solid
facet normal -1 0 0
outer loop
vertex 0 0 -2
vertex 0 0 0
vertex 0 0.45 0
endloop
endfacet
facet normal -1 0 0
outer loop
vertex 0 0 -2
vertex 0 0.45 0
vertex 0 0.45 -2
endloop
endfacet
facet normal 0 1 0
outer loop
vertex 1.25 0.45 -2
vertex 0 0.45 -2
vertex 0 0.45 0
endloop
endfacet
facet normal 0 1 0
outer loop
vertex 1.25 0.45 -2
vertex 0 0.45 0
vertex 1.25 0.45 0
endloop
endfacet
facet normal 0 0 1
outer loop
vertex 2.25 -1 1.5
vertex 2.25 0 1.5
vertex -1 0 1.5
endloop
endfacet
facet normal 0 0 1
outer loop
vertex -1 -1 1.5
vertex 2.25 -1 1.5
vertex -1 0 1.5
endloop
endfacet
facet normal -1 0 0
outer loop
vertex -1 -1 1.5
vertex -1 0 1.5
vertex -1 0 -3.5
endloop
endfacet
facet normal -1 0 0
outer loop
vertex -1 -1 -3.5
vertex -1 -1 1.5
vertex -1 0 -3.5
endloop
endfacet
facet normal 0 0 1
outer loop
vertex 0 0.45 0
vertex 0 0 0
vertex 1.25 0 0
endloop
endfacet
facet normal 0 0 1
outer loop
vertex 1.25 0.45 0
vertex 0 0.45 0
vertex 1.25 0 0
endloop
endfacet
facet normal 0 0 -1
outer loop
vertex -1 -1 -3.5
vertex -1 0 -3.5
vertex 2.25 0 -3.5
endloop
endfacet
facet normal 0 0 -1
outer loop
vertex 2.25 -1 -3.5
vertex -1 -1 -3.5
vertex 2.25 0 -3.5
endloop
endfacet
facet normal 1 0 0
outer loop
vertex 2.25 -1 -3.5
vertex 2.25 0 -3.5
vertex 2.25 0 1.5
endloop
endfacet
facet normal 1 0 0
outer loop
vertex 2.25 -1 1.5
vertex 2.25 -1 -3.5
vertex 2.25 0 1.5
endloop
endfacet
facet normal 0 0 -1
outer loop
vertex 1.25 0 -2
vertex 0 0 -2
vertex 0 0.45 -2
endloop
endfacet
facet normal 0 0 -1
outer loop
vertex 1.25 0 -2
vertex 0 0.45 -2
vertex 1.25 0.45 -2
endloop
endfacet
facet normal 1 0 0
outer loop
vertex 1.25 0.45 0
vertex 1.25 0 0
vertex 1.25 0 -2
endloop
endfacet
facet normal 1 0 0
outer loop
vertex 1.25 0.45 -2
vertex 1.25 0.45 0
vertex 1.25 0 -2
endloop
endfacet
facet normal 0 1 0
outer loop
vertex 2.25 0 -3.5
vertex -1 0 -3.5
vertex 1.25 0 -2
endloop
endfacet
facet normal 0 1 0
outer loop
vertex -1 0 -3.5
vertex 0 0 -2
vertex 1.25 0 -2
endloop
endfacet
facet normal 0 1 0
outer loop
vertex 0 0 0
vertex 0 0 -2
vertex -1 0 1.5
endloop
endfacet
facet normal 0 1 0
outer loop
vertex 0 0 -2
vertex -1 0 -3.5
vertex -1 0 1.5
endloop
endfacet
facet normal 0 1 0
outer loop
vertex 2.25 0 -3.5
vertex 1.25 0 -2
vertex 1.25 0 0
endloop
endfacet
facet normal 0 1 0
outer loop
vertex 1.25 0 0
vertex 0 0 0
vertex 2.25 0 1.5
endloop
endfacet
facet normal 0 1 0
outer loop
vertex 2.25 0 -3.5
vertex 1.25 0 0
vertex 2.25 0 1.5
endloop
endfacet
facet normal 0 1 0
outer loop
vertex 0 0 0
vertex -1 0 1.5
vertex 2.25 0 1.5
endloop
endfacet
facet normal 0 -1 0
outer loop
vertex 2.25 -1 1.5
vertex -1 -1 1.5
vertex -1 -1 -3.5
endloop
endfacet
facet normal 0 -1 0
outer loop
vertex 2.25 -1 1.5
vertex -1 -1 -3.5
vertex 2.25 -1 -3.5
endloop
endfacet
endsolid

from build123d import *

# Parameters (mm, degrees)
SKETCH1_W           = 1.25
SKETCH1_H           = 2
BOSS_EXTRUDE1_DEPTH = 0.45
BOSS_EXTRUDE3_DEPTH = 1


with BuildPart() as part:
    # Sketch1 → Boss-Extrude1 (new body)
    with BuildSketch(Plane(origin=(0, 0, 0), x_dir=(1, 0, 0), z_dir=(0, 1, 0))):
        with Locations((0.625, 1)):
            Rectangle(SKETCH1_W, SKETCH1_H)
    extrude(amount=BOSS_EXTRUDE1_DEPTH)

    # Sketch2 → Boss-Extrude3 (add)
    with BuildSketch(Plane.XZ):
        Polygon((0.56061007, -3.5), (0.625, -3.5), (2.25, -3.5), (2.25, 1.5), (-1, 1.5), (-1, -3.5), align=None)
    extrude(amount=BOSS_EXTRUDE3_DEPTH)


solid = part.part
